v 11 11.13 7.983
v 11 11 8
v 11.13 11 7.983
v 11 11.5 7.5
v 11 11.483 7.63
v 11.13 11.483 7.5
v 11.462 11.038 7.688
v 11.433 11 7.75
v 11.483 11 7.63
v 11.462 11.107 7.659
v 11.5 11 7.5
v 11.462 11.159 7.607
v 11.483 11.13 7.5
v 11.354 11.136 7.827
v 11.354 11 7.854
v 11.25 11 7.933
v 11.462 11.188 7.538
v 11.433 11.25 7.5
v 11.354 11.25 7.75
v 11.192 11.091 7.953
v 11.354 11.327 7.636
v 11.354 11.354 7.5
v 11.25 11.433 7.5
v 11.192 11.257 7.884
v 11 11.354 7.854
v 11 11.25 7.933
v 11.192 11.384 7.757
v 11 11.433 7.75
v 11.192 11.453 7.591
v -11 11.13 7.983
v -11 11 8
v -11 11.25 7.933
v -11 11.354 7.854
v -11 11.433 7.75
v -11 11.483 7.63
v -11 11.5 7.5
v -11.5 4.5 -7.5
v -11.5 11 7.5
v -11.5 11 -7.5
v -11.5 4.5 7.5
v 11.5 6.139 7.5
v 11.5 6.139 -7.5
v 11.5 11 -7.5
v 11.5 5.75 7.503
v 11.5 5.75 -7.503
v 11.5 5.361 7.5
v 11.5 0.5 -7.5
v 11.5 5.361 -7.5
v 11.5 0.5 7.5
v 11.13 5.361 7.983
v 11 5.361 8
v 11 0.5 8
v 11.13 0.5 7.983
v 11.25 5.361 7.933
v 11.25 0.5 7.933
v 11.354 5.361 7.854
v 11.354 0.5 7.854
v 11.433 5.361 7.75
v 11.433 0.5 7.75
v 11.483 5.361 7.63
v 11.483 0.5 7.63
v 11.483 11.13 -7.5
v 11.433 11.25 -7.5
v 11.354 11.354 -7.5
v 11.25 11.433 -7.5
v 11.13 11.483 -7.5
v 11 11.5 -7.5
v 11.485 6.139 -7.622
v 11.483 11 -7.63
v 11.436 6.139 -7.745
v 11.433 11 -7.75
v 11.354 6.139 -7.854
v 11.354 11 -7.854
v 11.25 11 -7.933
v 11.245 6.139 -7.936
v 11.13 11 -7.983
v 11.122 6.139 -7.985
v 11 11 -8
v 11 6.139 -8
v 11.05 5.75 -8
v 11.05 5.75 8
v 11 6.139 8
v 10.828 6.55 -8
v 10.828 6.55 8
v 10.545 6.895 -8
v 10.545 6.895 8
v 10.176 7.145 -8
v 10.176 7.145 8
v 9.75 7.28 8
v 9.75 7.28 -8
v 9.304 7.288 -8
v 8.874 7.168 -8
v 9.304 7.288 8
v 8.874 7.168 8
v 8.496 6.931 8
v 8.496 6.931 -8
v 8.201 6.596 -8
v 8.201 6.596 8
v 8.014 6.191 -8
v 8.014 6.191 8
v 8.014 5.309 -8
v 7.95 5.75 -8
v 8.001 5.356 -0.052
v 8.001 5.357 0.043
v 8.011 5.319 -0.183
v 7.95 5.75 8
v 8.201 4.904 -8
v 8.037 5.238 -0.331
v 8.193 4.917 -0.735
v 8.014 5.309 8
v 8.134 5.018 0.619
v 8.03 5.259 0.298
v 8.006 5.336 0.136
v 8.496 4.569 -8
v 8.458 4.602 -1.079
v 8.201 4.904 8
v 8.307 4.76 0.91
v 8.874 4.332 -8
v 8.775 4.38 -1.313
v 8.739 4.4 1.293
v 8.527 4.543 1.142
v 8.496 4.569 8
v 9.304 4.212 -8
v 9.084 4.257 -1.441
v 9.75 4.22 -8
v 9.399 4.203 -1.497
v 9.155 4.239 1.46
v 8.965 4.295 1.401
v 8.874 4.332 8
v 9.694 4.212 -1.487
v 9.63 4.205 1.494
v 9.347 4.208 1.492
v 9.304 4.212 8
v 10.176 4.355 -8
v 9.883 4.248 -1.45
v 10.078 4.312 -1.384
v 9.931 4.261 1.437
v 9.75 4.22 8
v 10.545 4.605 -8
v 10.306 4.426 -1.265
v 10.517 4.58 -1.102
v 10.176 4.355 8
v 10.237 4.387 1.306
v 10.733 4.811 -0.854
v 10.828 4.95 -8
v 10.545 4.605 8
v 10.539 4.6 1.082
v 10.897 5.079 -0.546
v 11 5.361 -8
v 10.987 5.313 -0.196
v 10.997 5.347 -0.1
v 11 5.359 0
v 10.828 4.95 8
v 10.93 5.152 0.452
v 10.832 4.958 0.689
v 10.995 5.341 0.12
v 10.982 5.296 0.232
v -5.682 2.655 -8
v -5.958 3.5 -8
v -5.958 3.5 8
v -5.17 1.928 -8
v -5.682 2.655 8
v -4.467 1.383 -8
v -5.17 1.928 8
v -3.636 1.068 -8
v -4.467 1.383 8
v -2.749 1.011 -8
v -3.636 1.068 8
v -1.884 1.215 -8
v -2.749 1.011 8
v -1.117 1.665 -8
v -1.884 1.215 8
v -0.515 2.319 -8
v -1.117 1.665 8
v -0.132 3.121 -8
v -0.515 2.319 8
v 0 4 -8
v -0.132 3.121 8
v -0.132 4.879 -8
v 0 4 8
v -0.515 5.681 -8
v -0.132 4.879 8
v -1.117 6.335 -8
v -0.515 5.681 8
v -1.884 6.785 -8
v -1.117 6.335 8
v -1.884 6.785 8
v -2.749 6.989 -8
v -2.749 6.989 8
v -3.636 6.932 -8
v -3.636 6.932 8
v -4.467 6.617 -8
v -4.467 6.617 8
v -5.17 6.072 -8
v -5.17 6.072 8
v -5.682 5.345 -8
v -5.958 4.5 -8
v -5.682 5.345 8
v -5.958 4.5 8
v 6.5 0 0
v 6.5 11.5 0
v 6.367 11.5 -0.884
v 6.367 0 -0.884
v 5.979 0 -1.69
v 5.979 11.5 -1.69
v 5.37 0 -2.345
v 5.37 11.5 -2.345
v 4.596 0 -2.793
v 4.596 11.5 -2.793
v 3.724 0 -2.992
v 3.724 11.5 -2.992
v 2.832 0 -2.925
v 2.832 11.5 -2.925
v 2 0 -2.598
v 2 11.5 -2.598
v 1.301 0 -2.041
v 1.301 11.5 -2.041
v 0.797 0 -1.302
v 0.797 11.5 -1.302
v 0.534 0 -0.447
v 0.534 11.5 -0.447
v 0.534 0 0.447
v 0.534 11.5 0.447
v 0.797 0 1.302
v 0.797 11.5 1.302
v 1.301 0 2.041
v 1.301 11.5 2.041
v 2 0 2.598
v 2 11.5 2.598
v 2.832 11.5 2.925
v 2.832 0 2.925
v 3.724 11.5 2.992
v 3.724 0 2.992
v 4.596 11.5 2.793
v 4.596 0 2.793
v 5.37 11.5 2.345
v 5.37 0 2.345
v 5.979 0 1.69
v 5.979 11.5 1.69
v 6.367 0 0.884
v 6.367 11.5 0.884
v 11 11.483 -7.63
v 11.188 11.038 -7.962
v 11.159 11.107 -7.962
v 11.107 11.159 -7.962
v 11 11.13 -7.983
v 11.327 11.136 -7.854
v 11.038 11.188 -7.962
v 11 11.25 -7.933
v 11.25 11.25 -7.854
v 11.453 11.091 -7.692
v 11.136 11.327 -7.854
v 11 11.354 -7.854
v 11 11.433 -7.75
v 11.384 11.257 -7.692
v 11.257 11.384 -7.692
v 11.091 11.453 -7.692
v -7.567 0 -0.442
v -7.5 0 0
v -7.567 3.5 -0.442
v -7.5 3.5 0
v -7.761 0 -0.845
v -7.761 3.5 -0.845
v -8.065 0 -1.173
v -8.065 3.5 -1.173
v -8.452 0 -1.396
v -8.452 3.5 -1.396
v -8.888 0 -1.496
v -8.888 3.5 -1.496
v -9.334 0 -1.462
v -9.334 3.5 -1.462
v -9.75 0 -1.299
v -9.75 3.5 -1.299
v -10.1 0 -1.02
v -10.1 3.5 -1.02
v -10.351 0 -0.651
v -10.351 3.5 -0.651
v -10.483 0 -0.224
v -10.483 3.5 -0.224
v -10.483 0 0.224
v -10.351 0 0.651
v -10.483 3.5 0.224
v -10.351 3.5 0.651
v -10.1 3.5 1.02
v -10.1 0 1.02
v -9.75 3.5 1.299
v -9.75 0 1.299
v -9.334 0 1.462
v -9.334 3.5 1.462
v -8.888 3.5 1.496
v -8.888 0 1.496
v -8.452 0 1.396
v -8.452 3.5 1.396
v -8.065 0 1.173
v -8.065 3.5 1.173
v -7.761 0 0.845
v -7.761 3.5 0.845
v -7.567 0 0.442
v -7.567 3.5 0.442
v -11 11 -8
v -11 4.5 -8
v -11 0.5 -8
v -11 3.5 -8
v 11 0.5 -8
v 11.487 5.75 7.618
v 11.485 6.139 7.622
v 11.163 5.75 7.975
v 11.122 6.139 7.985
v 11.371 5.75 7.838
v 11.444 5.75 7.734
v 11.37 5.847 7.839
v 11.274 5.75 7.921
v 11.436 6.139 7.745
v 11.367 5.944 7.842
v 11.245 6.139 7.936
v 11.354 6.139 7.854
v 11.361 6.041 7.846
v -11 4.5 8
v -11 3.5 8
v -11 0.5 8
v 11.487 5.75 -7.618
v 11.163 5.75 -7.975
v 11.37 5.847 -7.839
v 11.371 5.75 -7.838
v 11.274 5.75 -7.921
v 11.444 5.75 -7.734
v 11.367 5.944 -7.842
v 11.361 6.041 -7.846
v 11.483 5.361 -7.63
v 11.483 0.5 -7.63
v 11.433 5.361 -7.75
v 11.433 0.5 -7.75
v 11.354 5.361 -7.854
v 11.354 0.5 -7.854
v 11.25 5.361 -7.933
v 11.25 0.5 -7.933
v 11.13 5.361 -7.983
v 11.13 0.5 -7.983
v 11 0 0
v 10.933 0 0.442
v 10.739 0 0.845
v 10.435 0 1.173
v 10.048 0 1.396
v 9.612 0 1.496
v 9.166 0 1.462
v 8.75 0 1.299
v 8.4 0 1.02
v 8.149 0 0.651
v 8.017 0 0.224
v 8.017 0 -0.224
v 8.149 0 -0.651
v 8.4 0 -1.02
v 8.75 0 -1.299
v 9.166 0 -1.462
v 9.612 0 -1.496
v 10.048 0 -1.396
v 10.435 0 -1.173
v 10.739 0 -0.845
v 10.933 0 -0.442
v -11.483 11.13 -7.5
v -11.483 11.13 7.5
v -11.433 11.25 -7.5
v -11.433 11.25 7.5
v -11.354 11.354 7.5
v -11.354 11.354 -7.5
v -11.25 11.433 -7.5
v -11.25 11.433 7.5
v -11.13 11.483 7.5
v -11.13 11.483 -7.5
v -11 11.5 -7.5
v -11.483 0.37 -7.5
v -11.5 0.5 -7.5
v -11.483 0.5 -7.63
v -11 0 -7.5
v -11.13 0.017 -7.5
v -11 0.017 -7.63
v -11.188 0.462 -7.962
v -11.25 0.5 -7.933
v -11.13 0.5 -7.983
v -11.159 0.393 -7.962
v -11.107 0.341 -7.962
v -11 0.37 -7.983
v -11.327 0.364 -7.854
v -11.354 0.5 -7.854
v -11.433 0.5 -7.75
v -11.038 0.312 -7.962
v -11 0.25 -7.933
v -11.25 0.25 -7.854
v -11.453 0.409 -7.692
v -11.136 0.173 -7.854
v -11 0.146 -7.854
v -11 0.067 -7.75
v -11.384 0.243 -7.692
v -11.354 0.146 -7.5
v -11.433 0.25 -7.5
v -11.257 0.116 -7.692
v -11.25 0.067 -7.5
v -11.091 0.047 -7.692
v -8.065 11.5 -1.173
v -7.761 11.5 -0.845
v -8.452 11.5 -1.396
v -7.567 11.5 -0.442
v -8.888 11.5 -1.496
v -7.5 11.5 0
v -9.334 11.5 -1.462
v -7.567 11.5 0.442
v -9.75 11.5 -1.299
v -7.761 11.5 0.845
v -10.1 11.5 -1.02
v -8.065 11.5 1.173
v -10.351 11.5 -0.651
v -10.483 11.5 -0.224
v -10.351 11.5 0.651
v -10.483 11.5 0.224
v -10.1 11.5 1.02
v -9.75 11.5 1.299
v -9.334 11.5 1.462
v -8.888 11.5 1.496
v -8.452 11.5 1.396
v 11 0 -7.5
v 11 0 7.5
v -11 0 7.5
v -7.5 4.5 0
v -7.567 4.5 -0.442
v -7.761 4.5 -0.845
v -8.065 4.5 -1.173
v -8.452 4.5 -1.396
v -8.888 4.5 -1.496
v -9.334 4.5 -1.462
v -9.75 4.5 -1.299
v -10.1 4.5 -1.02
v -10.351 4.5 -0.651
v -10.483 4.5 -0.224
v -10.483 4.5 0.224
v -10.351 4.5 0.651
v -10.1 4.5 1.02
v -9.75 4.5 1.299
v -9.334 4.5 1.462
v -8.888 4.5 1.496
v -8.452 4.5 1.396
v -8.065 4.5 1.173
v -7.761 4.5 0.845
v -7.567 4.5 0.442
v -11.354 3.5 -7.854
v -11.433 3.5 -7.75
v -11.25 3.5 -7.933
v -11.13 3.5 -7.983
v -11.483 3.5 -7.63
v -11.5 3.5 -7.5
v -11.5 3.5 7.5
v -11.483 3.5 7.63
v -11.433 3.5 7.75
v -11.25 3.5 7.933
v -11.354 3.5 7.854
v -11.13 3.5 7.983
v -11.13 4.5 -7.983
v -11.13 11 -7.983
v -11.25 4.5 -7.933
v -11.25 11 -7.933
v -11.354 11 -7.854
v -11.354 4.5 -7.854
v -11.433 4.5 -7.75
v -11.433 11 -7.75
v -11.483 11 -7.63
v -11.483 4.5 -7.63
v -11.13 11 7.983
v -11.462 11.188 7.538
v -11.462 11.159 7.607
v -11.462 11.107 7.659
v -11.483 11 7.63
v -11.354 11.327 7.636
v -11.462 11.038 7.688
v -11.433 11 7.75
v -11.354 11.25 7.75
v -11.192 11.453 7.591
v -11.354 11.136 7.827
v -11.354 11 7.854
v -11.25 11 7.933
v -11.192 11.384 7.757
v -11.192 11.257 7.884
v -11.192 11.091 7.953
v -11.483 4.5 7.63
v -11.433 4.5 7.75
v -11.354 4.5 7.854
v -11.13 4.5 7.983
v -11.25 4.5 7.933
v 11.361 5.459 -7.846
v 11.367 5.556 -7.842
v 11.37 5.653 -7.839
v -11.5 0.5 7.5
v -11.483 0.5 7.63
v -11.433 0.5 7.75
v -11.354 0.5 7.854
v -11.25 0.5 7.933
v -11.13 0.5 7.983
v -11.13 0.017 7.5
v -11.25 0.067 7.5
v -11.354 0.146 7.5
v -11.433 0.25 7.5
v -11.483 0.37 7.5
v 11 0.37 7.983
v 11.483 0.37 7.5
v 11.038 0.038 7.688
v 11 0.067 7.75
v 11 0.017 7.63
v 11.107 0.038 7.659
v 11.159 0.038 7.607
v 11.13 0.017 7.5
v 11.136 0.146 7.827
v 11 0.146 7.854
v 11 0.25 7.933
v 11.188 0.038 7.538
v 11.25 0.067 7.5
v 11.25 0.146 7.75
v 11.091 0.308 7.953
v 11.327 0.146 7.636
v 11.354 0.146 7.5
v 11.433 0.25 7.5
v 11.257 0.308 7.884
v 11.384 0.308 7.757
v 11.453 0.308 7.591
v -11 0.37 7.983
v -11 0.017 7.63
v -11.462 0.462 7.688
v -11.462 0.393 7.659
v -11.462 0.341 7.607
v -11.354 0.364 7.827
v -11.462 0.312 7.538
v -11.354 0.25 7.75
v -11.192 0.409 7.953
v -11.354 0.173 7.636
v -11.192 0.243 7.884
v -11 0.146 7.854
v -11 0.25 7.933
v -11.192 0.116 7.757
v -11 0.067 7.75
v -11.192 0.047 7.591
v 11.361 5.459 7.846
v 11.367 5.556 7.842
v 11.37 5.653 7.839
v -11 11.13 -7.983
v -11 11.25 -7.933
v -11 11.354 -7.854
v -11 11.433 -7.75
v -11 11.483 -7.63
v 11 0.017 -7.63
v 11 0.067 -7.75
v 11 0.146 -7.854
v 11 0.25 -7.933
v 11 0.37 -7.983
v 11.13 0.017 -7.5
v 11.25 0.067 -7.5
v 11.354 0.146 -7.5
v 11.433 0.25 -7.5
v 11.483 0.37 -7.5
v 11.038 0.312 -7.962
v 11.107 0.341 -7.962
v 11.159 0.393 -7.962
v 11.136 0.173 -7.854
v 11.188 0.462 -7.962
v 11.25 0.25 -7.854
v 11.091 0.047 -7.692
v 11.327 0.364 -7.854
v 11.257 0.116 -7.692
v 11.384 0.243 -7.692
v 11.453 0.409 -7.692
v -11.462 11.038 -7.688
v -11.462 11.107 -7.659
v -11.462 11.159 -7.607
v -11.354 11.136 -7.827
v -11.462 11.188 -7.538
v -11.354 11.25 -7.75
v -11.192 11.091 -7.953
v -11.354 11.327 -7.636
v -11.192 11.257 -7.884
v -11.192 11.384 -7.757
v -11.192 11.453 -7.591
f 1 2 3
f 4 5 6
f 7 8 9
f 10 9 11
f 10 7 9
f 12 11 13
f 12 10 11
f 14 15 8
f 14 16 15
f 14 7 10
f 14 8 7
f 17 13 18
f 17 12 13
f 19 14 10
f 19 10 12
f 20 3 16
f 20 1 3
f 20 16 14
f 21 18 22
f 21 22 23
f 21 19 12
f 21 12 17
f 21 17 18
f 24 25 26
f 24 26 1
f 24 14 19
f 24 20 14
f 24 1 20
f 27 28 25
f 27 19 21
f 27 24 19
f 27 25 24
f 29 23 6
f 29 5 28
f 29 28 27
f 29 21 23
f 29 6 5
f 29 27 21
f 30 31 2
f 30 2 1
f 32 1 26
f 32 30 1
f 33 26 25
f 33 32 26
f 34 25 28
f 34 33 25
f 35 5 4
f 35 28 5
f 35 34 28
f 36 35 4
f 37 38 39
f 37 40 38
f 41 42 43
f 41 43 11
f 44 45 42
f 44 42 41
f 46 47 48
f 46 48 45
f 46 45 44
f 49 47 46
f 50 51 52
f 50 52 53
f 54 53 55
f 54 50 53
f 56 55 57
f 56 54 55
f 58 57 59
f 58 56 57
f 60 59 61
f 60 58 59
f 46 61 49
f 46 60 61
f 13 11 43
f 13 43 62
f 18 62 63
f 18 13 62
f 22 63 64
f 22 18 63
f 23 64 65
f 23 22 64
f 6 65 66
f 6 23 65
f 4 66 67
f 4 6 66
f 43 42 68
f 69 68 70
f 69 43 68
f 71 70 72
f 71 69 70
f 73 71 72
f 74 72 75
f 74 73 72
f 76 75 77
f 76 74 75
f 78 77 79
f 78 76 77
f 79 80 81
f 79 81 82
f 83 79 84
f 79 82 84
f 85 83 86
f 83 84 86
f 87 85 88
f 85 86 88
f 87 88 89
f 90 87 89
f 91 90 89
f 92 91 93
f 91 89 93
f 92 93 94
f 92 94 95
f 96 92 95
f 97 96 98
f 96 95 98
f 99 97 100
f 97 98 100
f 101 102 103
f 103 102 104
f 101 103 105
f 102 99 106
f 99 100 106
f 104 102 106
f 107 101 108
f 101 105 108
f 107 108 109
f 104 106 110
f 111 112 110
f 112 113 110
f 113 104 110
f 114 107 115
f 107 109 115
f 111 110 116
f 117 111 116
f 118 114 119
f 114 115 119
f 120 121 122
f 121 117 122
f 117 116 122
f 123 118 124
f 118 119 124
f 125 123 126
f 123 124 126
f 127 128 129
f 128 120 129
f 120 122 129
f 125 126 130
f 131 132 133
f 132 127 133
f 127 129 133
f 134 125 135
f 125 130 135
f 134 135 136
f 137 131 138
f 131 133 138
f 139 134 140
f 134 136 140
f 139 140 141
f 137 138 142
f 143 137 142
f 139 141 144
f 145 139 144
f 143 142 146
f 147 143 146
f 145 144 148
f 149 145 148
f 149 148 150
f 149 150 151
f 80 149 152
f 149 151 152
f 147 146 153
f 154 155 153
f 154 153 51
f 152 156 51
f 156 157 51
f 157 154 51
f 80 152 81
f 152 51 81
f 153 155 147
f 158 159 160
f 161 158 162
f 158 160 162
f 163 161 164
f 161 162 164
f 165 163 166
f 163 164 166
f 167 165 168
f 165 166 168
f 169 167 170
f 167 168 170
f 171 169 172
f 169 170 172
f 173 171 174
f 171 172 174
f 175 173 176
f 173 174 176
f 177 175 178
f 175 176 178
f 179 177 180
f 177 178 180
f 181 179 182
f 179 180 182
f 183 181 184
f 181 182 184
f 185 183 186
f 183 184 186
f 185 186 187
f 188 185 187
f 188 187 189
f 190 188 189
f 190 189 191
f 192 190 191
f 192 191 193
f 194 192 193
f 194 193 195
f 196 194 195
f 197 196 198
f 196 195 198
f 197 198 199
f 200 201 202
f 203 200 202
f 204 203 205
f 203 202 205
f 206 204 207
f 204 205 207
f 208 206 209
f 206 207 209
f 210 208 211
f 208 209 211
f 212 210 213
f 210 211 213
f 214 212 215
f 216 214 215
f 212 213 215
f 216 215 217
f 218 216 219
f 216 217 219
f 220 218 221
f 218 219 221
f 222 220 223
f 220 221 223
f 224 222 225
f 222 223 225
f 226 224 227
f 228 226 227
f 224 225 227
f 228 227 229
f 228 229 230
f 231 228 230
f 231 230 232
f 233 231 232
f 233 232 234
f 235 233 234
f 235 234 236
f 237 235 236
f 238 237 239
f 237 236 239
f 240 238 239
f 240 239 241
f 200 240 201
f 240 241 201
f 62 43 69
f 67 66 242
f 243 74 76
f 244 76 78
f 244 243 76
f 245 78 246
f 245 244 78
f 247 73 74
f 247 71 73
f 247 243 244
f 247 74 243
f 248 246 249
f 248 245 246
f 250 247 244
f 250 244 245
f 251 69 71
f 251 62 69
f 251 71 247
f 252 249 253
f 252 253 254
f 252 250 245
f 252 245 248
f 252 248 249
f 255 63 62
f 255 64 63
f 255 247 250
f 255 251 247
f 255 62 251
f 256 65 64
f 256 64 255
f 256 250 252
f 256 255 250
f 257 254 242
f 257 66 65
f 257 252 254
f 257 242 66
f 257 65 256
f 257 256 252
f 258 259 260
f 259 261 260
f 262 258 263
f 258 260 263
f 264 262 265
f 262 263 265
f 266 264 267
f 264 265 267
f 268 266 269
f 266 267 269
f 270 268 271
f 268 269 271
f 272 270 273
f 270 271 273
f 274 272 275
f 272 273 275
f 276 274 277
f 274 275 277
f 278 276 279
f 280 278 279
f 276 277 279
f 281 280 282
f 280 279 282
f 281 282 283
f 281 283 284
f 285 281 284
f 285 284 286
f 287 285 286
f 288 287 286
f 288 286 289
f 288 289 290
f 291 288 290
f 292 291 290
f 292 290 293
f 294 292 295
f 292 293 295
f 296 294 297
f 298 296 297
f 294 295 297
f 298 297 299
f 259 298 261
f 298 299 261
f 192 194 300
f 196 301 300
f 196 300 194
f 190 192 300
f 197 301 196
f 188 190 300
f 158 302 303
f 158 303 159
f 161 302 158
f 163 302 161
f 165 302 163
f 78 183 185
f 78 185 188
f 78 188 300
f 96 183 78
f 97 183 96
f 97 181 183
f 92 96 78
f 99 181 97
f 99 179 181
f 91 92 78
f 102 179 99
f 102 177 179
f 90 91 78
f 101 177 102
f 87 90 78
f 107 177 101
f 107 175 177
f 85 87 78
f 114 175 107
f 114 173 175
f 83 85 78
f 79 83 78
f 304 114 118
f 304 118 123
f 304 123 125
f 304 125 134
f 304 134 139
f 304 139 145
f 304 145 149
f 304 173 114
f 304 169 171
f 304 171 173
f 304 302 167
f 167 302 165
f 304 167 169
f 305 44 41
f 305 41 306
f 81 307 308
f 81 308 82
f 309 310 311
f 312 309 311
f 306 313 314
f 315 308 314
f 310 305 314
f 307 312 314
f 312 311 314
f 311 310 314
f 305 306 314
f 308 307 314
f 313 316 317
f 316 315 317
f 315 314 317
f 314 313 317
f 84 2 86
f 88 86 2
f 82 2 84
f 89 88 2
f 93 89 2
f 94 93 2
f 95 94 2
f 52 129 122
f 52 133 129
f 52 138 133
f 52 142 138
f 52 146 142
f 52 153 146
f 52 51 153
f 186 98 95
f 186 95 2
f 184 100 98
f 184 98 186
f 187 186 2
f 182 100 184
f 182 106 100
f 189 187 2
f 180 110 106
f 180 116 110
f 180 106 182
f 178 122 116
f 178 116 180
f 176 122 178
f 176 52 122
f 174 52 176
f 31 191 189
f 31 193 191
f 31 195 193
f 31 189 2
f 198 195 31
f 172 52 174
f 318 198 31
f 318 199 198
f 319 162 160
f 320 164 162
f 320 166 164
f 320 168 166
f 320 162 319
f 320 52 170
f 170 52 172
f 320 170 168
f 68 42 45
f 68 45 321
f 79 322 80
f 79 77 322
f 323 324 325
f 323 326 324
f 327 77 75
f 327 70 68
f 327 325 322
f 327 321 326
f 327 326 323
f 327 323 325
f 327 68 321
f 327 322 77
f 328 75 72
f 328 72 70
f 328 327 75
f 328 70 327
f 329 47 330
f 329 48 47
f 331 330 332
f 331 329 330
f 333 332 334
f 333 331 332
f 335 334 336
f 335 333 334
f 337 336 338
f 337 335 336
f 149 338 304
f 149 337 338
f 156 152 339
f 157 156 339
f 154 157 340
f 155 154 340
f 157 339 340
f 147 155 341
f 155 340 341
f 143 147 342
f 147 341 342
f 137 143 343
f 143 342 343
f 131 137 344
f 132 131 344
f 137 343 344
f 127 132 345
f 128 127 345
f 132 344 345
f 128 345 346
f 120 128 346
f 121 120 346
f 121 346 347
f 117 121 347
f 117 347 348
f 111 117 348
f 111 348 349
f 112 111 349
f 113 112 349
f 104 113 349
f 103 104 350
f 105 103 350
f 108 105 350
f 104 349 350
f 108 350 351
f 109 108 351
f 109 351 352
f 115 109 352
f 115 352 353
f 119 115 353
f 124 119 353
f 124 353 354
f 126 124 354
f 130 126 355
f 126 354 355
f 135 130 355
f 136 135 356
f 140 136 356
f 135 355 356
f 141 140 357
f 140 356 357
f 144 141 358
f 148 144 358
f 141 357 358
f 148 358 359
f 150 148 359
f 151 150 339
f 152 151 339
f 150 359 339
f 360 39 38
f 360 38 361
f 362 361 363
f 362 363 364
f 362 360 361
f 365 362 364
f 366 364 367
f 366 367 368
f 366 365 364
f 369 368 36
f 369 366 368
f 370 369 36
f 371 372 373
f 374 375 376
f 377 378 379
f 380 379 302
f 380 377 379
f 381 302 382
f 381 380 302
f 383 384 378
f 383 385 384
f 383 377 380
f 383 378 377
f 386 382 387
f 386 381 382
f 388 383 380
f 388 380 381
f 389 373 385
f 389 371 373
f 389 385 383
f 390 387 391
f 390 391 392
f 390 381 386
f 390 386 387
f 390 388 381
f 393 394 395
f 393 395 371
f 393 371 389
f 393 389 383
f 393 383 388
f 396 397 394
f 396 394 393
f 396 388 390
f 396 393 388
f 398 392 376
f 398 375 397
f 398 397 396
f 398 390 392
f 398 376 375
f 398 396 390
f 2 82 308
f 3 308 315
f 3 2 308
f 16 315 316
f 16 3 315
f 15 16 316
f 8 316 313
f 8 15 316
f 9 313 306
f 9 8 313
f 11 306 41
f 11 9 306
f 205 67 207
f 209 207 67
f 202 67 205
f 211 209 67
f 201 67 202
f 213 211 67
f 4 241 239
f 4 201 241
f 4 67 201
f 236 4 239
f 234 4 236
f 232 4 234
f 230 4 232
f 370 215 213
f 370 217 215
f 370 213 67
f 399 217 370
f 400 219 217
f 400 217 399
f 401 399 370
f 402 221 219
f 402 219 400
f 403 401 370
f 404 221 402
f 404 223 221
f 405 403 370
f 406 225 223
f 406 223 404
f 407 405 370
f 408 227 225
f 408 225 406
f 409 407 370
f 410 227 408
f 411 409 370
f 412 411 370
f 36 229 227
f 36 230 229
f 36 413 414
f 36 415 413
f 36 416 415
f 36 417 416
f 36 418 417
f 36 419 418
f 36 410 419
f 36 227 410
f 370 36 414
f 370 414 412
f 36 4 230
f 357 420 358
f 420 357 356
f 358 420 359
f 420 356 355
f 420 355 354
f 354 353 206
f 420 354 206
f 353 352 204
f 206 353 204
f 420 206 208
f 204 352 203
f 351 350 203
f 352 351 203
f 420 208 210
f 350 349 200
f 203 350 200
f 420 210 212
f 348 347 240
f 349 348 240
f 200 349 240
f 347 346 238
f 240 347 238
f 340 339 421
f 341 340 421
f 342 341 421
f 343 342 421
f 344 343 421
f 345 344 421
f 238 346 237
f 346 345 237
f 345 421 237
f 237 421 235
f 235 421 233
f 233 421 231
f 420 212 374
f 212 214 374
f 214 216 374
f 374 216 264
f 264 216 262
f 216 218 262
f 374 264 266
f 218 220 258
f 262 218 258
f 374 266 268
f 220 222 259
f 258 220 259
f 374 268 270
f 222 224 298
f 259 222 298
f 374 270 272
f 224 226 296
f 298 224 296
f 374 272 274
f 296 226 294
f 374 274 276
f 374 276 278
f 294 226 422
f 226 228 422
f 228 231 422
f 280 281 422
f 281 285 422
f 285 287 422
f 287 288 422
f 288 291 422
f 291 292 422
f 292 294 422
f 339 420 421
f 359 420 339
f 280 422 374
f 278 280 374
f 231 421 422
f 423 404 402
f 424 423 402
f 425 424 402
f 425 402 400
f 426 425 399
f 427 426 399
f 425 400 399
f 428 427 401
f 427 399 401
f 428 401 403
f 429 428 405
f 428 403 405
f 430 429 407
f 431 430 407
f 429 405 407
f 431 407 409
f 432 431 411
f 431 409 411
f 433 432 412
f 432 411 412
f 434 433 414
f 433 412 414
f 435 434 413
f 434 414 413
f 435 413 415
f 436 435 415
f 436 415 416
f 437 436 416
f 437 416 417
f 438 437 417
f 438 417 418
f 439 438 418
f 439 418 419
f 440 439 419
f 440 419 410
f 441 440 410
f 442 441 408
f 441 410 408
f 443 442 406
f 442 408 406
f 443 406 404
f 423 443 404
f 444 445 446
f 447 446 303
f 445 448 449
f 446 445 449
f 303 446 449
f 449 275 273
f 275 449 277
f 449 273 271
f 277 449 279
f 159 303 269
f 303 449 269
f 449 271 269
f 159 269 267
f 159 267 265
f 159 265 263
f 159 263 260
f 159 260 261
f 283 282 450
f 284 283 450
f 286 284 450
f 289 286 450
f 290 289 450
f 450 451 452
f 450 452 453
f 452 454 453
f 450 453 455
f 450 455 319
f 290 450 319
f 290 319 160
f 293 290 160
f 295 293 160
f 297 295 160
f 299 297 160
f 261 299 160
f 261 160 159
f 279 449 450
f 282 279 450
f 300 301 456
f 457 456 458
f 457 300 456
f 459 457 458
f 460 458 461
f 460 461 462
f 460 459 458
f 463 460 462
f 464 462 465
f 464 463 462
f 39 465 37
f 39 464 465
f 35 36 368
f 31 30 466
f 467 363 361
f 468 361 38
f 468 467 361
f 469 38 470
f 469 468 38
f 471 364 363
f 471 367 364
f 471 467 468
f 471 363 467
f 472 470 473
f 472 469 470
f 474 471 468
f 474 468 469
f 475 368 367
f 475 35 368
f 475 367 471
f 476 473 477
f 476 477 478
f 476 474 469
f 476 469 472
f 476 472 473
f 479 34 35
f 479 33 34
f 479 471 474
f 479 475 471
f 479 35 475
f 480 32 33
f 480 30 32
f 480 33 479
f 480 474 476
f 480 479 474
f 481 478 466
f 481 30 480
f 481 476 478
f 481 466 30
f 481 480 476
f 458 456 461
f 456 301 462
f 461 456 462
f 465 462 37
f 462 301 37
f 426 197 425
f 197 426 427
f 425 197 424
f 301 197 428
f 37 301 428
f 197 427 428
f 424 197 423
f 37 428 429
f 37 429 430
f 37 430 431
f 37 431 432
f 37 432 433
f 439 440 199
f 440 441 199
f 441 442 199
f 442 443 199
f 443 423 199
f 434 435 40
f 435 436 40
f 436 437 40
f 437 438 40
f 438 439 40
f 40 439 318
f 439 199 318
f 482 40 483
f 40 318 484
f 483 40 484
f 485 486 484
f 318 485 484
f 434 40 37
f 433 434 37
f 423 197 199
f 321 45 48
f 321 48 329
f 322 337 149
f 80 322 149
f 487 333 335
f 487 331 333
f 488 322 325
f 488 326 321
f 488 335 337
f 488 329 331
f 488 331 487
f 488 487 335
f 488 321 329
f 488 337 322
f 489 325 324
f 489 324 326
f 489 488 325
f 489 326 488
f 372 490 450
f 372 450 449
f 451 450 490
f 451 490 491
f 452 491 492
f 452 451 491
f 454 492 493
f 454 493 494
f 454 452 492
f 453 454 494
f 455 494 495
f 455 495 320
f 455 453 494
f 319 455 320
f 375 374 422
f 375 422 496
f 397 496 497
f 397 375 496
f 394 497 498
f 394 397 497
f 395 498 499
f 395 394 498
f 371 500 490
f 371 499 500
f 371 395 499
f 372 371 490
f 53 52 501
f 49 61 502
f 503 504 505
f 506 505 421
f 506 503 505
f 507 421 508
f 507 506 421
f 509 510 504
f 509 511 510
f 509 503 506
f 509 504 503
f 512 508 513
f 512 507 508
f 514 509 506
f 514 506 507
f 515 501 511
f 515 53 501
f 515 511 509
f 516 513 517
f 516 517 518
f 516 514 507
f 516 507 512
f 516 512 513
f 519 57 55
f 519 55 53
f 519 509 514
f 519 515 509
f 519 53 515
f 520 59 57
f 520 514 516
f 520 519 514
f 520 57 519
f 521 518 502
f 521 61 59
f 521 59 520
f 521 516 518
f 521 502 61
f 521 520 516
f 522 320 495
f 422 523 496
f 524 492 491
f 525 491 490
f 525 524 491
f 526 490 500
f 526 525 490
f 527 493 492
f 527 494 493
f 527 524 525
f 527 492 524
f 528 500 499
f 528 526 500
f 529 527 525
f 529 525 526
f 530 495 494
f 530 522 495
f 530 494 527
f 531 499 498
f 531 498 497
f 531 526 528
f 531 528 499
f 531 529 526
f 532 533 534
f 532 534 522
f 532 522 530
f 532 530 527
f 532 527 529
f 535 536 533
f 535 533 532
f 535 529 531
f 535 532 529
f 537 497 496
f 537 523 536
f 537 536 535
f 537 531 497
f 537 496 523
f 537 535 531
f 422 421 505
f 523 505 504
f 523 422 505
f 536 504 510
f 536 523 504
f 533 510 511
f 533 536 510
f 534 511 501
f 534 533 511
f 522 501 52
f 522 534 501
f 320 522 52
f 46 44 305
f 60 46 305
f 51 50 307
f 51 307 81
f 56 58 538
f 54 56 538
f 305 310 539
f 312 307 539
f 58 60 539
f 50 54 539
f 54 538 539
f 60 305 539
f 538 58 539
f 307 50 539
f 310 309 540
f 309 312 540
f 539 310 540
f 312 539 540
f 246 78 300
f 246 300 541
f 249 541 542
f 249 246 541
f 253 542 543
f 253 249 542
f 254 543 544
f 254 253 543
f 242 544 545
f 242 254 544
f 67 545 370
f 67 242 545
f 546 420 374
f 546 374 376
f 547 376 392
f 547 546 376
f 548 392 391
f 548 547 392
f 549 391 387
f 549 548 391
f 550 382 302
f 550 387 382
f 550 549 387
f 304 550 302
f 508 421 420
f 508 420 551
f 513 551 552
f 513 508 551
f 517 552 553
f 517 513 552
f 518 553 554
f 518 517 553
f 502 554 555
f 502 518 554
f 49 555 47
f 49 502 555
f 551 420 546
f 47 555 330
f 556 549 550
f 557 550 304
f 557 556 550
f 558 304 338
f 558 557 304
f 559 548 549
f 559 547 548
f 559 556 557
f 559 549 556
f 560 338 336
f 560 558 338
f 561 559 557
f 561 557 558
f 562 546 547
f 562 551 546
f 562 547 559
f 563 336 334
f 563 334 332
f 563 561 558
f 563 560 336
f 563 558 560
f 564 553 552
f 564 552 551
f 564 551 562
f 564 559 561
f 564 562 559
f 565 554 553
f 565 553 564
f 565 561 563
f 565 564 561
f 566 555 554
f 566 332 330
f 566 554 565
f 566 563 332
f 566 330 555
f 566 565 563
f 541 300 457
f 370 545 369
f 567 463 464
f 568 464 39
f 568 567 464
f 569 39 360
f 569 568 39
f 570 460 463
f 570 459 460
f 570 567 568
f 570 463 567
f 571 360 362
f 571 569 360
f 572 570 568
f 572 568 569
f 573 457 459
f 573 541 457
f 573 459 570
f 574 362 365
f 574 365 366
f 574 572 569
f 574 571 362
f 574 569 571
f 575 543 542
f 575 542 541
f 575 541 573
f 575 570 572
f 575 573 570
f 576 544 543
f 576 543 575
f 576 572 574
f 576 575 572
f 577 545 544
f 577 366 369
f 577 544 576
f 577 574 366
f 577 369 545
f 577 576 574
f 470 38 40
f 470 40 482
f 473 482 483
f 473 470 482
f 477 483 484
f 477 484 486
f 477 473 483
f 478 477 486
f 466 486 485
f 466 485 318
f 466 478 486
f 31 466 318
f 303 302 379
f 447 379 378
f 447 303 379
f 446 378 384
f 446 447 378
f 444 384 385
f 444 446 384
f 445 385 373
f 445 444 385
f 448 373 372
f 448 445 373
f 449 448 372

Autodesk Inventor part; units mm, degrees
ref_plane "YZ Plane" through (0, 0, 0) normal (1, 0, 0) x (0, 1, 0)
ref_plane "XZ Plane" through (0, 0, 0) normal (0, 1, 0) x (-1, 0, 0)
ref_plane "XY Plane" through (0, 0, 0) normal (0, 0, 1) x (1, 0, 0)
sketch "Эскиз1" plane through (0, 0, 0) normal (0, 1, 0) x (-1, 0, 0)
  line L0 (11.5, -8) -> (-11.5, -8)
  line L1 (-11.5, -8) -> (-11.5, 8)
  line L2 (-11.5, 8) -> (11.5, 8)
  line L3 (11.5, 8) -> (11.5, -8)
  line L4 (11.5, -8) -> (-11.5, 8) construction
  line L5 (-11.5, -8) -> (11.5, 8) construction
  point P0 (0, 0)
  dimension "d0" = 23
  dimension "d1" = 16
extrude "Выдавливание1" add sketch "Эскиз1" along normal blind 11.5
sketch "Эскиз2" plane through (-11.5, 0, 8) normal (0, 0, 1) x (1, 0, 0)
  line L0 (0, 0) -> (0, 11.5) projected
  line L1 (23, 0) -> (8.5, 0) construction
  line L2 (8.5, 0) -> (8.5, 4) construction
  line L3 (8.5, 4) -> (23, 4) construction
  line L4 (23, 4) -> (23, 0) construction
  line L5 (23, 0) -> (21, 0) construction
  line L6 (21, 0) -> (21, 5.75) construction
  line L7 (21, 5.75) -> (23, 5.75) construction
  line L8 (23, 5.75) -> (23, 0) construction
  circle A0 centre (8.5, 4) radius 3
  circle A1 centre (21, 5.75) radius 1.55
  line L9 (-8.5, 3.5) -> (8.5, 3.5)
  line L10 (8.5, 3.5) -> (8.5, 4.5)
  line L11 (8.5, 4.5) -> (-8.5, 4.5)
  line L12 (-8.5, 4.5) -> (-8.5, 3.5)
  line L13 (-8.5, 3.5) -> (8.5, 4.5) construction
  line L14 (8.5, 3.5) -> (-8.5, 4.5) construction
  point P0 (11.5, 0)
  point P1 (0, 4)
  dimension "d4" = 14.5
  dimension "d5" = 4
  dimension "d6" = 2
  dimension "d7" = 5.75
  dimension "d8" = 6
  dimension "d9" = 3.1
  dimension "d10" = 1
extrude "Выдавливание2" cut sketch "Эскиз2" against normal up to next
sketch "Эскиз3" plane through (0, 11.5, 0) normal (0, 1, 0) x (1, 0, 0)
  line L0 (11.5, -8) -> (11.5, 8) projected
  line L1 (11.5, 0) -> (-9, 0) construction
  line L2 (11.5, 0) -> (3.5, 0) construction
  circle A0 centre (-9, 0) radius 1.5
  circle A1 centre (3.5, 0) radius 3
  point P0 (0, 0)
  dimension "d13" = 20.5
  dimension "d14" = 8
  dimension "d15" = 3
  dimension "d16" = 6
extrude "Выдавливание3" cut sketch "Эскиз3" against normal up to surface (11.5 mm away)
sketch "Эскиз4" plane through (0, 0, 0) normal (0, -1, 0) x (1, 0, 0)
  line L0 (11.5, -8) -> (11.5, 8) projected
  line L1 (-11.5, 8) -> (-11.5, -8) projected
  line L2 (11.5, 0) -> (9.5, 0) construction
  circle A0 centre (9.5, 0) radius 1.5
  point P0 (0, 0)
  dimension "d19" = 2
  dimension "d20" = 3
extrude "Выдавливание4" cut sketch "Эскиз4" against normal up to next
fillet "Сопряжение1" radius 0.5 14 edges at (0, 11.5, 8) (11.5, 11.5, 0) (11.5, 5.75, 8) (11.5, 0, 0) (11.5, 5.75, -8) (0, 11.5, -8) (-11.5, 11.5, 0) (0, 0, 8) (-11.5, 0, 0) (0, 0, -8) (-11.5, 1.75, 8) (-11.5, 8, 8) (-11.5, 8, -8) (-11.5, 1.75, -8)
thread "Резьба1" size "M3x0.5" class "6H" standard "ANSI Metric M Profile" full length
thread "Резьба2" size "M3x0.5" class "6H" standard "ANSI Metric M Profile" full length
thread "Резьба3" size "M6x1" class "6H" standard "ANSI Metric M Profile" full length
thread "Резьба4" size "M3x0.5" class "6H" standard "ANSI Metric M Profile" full length
properties part number "BLOCK-CARTRIDGE"
